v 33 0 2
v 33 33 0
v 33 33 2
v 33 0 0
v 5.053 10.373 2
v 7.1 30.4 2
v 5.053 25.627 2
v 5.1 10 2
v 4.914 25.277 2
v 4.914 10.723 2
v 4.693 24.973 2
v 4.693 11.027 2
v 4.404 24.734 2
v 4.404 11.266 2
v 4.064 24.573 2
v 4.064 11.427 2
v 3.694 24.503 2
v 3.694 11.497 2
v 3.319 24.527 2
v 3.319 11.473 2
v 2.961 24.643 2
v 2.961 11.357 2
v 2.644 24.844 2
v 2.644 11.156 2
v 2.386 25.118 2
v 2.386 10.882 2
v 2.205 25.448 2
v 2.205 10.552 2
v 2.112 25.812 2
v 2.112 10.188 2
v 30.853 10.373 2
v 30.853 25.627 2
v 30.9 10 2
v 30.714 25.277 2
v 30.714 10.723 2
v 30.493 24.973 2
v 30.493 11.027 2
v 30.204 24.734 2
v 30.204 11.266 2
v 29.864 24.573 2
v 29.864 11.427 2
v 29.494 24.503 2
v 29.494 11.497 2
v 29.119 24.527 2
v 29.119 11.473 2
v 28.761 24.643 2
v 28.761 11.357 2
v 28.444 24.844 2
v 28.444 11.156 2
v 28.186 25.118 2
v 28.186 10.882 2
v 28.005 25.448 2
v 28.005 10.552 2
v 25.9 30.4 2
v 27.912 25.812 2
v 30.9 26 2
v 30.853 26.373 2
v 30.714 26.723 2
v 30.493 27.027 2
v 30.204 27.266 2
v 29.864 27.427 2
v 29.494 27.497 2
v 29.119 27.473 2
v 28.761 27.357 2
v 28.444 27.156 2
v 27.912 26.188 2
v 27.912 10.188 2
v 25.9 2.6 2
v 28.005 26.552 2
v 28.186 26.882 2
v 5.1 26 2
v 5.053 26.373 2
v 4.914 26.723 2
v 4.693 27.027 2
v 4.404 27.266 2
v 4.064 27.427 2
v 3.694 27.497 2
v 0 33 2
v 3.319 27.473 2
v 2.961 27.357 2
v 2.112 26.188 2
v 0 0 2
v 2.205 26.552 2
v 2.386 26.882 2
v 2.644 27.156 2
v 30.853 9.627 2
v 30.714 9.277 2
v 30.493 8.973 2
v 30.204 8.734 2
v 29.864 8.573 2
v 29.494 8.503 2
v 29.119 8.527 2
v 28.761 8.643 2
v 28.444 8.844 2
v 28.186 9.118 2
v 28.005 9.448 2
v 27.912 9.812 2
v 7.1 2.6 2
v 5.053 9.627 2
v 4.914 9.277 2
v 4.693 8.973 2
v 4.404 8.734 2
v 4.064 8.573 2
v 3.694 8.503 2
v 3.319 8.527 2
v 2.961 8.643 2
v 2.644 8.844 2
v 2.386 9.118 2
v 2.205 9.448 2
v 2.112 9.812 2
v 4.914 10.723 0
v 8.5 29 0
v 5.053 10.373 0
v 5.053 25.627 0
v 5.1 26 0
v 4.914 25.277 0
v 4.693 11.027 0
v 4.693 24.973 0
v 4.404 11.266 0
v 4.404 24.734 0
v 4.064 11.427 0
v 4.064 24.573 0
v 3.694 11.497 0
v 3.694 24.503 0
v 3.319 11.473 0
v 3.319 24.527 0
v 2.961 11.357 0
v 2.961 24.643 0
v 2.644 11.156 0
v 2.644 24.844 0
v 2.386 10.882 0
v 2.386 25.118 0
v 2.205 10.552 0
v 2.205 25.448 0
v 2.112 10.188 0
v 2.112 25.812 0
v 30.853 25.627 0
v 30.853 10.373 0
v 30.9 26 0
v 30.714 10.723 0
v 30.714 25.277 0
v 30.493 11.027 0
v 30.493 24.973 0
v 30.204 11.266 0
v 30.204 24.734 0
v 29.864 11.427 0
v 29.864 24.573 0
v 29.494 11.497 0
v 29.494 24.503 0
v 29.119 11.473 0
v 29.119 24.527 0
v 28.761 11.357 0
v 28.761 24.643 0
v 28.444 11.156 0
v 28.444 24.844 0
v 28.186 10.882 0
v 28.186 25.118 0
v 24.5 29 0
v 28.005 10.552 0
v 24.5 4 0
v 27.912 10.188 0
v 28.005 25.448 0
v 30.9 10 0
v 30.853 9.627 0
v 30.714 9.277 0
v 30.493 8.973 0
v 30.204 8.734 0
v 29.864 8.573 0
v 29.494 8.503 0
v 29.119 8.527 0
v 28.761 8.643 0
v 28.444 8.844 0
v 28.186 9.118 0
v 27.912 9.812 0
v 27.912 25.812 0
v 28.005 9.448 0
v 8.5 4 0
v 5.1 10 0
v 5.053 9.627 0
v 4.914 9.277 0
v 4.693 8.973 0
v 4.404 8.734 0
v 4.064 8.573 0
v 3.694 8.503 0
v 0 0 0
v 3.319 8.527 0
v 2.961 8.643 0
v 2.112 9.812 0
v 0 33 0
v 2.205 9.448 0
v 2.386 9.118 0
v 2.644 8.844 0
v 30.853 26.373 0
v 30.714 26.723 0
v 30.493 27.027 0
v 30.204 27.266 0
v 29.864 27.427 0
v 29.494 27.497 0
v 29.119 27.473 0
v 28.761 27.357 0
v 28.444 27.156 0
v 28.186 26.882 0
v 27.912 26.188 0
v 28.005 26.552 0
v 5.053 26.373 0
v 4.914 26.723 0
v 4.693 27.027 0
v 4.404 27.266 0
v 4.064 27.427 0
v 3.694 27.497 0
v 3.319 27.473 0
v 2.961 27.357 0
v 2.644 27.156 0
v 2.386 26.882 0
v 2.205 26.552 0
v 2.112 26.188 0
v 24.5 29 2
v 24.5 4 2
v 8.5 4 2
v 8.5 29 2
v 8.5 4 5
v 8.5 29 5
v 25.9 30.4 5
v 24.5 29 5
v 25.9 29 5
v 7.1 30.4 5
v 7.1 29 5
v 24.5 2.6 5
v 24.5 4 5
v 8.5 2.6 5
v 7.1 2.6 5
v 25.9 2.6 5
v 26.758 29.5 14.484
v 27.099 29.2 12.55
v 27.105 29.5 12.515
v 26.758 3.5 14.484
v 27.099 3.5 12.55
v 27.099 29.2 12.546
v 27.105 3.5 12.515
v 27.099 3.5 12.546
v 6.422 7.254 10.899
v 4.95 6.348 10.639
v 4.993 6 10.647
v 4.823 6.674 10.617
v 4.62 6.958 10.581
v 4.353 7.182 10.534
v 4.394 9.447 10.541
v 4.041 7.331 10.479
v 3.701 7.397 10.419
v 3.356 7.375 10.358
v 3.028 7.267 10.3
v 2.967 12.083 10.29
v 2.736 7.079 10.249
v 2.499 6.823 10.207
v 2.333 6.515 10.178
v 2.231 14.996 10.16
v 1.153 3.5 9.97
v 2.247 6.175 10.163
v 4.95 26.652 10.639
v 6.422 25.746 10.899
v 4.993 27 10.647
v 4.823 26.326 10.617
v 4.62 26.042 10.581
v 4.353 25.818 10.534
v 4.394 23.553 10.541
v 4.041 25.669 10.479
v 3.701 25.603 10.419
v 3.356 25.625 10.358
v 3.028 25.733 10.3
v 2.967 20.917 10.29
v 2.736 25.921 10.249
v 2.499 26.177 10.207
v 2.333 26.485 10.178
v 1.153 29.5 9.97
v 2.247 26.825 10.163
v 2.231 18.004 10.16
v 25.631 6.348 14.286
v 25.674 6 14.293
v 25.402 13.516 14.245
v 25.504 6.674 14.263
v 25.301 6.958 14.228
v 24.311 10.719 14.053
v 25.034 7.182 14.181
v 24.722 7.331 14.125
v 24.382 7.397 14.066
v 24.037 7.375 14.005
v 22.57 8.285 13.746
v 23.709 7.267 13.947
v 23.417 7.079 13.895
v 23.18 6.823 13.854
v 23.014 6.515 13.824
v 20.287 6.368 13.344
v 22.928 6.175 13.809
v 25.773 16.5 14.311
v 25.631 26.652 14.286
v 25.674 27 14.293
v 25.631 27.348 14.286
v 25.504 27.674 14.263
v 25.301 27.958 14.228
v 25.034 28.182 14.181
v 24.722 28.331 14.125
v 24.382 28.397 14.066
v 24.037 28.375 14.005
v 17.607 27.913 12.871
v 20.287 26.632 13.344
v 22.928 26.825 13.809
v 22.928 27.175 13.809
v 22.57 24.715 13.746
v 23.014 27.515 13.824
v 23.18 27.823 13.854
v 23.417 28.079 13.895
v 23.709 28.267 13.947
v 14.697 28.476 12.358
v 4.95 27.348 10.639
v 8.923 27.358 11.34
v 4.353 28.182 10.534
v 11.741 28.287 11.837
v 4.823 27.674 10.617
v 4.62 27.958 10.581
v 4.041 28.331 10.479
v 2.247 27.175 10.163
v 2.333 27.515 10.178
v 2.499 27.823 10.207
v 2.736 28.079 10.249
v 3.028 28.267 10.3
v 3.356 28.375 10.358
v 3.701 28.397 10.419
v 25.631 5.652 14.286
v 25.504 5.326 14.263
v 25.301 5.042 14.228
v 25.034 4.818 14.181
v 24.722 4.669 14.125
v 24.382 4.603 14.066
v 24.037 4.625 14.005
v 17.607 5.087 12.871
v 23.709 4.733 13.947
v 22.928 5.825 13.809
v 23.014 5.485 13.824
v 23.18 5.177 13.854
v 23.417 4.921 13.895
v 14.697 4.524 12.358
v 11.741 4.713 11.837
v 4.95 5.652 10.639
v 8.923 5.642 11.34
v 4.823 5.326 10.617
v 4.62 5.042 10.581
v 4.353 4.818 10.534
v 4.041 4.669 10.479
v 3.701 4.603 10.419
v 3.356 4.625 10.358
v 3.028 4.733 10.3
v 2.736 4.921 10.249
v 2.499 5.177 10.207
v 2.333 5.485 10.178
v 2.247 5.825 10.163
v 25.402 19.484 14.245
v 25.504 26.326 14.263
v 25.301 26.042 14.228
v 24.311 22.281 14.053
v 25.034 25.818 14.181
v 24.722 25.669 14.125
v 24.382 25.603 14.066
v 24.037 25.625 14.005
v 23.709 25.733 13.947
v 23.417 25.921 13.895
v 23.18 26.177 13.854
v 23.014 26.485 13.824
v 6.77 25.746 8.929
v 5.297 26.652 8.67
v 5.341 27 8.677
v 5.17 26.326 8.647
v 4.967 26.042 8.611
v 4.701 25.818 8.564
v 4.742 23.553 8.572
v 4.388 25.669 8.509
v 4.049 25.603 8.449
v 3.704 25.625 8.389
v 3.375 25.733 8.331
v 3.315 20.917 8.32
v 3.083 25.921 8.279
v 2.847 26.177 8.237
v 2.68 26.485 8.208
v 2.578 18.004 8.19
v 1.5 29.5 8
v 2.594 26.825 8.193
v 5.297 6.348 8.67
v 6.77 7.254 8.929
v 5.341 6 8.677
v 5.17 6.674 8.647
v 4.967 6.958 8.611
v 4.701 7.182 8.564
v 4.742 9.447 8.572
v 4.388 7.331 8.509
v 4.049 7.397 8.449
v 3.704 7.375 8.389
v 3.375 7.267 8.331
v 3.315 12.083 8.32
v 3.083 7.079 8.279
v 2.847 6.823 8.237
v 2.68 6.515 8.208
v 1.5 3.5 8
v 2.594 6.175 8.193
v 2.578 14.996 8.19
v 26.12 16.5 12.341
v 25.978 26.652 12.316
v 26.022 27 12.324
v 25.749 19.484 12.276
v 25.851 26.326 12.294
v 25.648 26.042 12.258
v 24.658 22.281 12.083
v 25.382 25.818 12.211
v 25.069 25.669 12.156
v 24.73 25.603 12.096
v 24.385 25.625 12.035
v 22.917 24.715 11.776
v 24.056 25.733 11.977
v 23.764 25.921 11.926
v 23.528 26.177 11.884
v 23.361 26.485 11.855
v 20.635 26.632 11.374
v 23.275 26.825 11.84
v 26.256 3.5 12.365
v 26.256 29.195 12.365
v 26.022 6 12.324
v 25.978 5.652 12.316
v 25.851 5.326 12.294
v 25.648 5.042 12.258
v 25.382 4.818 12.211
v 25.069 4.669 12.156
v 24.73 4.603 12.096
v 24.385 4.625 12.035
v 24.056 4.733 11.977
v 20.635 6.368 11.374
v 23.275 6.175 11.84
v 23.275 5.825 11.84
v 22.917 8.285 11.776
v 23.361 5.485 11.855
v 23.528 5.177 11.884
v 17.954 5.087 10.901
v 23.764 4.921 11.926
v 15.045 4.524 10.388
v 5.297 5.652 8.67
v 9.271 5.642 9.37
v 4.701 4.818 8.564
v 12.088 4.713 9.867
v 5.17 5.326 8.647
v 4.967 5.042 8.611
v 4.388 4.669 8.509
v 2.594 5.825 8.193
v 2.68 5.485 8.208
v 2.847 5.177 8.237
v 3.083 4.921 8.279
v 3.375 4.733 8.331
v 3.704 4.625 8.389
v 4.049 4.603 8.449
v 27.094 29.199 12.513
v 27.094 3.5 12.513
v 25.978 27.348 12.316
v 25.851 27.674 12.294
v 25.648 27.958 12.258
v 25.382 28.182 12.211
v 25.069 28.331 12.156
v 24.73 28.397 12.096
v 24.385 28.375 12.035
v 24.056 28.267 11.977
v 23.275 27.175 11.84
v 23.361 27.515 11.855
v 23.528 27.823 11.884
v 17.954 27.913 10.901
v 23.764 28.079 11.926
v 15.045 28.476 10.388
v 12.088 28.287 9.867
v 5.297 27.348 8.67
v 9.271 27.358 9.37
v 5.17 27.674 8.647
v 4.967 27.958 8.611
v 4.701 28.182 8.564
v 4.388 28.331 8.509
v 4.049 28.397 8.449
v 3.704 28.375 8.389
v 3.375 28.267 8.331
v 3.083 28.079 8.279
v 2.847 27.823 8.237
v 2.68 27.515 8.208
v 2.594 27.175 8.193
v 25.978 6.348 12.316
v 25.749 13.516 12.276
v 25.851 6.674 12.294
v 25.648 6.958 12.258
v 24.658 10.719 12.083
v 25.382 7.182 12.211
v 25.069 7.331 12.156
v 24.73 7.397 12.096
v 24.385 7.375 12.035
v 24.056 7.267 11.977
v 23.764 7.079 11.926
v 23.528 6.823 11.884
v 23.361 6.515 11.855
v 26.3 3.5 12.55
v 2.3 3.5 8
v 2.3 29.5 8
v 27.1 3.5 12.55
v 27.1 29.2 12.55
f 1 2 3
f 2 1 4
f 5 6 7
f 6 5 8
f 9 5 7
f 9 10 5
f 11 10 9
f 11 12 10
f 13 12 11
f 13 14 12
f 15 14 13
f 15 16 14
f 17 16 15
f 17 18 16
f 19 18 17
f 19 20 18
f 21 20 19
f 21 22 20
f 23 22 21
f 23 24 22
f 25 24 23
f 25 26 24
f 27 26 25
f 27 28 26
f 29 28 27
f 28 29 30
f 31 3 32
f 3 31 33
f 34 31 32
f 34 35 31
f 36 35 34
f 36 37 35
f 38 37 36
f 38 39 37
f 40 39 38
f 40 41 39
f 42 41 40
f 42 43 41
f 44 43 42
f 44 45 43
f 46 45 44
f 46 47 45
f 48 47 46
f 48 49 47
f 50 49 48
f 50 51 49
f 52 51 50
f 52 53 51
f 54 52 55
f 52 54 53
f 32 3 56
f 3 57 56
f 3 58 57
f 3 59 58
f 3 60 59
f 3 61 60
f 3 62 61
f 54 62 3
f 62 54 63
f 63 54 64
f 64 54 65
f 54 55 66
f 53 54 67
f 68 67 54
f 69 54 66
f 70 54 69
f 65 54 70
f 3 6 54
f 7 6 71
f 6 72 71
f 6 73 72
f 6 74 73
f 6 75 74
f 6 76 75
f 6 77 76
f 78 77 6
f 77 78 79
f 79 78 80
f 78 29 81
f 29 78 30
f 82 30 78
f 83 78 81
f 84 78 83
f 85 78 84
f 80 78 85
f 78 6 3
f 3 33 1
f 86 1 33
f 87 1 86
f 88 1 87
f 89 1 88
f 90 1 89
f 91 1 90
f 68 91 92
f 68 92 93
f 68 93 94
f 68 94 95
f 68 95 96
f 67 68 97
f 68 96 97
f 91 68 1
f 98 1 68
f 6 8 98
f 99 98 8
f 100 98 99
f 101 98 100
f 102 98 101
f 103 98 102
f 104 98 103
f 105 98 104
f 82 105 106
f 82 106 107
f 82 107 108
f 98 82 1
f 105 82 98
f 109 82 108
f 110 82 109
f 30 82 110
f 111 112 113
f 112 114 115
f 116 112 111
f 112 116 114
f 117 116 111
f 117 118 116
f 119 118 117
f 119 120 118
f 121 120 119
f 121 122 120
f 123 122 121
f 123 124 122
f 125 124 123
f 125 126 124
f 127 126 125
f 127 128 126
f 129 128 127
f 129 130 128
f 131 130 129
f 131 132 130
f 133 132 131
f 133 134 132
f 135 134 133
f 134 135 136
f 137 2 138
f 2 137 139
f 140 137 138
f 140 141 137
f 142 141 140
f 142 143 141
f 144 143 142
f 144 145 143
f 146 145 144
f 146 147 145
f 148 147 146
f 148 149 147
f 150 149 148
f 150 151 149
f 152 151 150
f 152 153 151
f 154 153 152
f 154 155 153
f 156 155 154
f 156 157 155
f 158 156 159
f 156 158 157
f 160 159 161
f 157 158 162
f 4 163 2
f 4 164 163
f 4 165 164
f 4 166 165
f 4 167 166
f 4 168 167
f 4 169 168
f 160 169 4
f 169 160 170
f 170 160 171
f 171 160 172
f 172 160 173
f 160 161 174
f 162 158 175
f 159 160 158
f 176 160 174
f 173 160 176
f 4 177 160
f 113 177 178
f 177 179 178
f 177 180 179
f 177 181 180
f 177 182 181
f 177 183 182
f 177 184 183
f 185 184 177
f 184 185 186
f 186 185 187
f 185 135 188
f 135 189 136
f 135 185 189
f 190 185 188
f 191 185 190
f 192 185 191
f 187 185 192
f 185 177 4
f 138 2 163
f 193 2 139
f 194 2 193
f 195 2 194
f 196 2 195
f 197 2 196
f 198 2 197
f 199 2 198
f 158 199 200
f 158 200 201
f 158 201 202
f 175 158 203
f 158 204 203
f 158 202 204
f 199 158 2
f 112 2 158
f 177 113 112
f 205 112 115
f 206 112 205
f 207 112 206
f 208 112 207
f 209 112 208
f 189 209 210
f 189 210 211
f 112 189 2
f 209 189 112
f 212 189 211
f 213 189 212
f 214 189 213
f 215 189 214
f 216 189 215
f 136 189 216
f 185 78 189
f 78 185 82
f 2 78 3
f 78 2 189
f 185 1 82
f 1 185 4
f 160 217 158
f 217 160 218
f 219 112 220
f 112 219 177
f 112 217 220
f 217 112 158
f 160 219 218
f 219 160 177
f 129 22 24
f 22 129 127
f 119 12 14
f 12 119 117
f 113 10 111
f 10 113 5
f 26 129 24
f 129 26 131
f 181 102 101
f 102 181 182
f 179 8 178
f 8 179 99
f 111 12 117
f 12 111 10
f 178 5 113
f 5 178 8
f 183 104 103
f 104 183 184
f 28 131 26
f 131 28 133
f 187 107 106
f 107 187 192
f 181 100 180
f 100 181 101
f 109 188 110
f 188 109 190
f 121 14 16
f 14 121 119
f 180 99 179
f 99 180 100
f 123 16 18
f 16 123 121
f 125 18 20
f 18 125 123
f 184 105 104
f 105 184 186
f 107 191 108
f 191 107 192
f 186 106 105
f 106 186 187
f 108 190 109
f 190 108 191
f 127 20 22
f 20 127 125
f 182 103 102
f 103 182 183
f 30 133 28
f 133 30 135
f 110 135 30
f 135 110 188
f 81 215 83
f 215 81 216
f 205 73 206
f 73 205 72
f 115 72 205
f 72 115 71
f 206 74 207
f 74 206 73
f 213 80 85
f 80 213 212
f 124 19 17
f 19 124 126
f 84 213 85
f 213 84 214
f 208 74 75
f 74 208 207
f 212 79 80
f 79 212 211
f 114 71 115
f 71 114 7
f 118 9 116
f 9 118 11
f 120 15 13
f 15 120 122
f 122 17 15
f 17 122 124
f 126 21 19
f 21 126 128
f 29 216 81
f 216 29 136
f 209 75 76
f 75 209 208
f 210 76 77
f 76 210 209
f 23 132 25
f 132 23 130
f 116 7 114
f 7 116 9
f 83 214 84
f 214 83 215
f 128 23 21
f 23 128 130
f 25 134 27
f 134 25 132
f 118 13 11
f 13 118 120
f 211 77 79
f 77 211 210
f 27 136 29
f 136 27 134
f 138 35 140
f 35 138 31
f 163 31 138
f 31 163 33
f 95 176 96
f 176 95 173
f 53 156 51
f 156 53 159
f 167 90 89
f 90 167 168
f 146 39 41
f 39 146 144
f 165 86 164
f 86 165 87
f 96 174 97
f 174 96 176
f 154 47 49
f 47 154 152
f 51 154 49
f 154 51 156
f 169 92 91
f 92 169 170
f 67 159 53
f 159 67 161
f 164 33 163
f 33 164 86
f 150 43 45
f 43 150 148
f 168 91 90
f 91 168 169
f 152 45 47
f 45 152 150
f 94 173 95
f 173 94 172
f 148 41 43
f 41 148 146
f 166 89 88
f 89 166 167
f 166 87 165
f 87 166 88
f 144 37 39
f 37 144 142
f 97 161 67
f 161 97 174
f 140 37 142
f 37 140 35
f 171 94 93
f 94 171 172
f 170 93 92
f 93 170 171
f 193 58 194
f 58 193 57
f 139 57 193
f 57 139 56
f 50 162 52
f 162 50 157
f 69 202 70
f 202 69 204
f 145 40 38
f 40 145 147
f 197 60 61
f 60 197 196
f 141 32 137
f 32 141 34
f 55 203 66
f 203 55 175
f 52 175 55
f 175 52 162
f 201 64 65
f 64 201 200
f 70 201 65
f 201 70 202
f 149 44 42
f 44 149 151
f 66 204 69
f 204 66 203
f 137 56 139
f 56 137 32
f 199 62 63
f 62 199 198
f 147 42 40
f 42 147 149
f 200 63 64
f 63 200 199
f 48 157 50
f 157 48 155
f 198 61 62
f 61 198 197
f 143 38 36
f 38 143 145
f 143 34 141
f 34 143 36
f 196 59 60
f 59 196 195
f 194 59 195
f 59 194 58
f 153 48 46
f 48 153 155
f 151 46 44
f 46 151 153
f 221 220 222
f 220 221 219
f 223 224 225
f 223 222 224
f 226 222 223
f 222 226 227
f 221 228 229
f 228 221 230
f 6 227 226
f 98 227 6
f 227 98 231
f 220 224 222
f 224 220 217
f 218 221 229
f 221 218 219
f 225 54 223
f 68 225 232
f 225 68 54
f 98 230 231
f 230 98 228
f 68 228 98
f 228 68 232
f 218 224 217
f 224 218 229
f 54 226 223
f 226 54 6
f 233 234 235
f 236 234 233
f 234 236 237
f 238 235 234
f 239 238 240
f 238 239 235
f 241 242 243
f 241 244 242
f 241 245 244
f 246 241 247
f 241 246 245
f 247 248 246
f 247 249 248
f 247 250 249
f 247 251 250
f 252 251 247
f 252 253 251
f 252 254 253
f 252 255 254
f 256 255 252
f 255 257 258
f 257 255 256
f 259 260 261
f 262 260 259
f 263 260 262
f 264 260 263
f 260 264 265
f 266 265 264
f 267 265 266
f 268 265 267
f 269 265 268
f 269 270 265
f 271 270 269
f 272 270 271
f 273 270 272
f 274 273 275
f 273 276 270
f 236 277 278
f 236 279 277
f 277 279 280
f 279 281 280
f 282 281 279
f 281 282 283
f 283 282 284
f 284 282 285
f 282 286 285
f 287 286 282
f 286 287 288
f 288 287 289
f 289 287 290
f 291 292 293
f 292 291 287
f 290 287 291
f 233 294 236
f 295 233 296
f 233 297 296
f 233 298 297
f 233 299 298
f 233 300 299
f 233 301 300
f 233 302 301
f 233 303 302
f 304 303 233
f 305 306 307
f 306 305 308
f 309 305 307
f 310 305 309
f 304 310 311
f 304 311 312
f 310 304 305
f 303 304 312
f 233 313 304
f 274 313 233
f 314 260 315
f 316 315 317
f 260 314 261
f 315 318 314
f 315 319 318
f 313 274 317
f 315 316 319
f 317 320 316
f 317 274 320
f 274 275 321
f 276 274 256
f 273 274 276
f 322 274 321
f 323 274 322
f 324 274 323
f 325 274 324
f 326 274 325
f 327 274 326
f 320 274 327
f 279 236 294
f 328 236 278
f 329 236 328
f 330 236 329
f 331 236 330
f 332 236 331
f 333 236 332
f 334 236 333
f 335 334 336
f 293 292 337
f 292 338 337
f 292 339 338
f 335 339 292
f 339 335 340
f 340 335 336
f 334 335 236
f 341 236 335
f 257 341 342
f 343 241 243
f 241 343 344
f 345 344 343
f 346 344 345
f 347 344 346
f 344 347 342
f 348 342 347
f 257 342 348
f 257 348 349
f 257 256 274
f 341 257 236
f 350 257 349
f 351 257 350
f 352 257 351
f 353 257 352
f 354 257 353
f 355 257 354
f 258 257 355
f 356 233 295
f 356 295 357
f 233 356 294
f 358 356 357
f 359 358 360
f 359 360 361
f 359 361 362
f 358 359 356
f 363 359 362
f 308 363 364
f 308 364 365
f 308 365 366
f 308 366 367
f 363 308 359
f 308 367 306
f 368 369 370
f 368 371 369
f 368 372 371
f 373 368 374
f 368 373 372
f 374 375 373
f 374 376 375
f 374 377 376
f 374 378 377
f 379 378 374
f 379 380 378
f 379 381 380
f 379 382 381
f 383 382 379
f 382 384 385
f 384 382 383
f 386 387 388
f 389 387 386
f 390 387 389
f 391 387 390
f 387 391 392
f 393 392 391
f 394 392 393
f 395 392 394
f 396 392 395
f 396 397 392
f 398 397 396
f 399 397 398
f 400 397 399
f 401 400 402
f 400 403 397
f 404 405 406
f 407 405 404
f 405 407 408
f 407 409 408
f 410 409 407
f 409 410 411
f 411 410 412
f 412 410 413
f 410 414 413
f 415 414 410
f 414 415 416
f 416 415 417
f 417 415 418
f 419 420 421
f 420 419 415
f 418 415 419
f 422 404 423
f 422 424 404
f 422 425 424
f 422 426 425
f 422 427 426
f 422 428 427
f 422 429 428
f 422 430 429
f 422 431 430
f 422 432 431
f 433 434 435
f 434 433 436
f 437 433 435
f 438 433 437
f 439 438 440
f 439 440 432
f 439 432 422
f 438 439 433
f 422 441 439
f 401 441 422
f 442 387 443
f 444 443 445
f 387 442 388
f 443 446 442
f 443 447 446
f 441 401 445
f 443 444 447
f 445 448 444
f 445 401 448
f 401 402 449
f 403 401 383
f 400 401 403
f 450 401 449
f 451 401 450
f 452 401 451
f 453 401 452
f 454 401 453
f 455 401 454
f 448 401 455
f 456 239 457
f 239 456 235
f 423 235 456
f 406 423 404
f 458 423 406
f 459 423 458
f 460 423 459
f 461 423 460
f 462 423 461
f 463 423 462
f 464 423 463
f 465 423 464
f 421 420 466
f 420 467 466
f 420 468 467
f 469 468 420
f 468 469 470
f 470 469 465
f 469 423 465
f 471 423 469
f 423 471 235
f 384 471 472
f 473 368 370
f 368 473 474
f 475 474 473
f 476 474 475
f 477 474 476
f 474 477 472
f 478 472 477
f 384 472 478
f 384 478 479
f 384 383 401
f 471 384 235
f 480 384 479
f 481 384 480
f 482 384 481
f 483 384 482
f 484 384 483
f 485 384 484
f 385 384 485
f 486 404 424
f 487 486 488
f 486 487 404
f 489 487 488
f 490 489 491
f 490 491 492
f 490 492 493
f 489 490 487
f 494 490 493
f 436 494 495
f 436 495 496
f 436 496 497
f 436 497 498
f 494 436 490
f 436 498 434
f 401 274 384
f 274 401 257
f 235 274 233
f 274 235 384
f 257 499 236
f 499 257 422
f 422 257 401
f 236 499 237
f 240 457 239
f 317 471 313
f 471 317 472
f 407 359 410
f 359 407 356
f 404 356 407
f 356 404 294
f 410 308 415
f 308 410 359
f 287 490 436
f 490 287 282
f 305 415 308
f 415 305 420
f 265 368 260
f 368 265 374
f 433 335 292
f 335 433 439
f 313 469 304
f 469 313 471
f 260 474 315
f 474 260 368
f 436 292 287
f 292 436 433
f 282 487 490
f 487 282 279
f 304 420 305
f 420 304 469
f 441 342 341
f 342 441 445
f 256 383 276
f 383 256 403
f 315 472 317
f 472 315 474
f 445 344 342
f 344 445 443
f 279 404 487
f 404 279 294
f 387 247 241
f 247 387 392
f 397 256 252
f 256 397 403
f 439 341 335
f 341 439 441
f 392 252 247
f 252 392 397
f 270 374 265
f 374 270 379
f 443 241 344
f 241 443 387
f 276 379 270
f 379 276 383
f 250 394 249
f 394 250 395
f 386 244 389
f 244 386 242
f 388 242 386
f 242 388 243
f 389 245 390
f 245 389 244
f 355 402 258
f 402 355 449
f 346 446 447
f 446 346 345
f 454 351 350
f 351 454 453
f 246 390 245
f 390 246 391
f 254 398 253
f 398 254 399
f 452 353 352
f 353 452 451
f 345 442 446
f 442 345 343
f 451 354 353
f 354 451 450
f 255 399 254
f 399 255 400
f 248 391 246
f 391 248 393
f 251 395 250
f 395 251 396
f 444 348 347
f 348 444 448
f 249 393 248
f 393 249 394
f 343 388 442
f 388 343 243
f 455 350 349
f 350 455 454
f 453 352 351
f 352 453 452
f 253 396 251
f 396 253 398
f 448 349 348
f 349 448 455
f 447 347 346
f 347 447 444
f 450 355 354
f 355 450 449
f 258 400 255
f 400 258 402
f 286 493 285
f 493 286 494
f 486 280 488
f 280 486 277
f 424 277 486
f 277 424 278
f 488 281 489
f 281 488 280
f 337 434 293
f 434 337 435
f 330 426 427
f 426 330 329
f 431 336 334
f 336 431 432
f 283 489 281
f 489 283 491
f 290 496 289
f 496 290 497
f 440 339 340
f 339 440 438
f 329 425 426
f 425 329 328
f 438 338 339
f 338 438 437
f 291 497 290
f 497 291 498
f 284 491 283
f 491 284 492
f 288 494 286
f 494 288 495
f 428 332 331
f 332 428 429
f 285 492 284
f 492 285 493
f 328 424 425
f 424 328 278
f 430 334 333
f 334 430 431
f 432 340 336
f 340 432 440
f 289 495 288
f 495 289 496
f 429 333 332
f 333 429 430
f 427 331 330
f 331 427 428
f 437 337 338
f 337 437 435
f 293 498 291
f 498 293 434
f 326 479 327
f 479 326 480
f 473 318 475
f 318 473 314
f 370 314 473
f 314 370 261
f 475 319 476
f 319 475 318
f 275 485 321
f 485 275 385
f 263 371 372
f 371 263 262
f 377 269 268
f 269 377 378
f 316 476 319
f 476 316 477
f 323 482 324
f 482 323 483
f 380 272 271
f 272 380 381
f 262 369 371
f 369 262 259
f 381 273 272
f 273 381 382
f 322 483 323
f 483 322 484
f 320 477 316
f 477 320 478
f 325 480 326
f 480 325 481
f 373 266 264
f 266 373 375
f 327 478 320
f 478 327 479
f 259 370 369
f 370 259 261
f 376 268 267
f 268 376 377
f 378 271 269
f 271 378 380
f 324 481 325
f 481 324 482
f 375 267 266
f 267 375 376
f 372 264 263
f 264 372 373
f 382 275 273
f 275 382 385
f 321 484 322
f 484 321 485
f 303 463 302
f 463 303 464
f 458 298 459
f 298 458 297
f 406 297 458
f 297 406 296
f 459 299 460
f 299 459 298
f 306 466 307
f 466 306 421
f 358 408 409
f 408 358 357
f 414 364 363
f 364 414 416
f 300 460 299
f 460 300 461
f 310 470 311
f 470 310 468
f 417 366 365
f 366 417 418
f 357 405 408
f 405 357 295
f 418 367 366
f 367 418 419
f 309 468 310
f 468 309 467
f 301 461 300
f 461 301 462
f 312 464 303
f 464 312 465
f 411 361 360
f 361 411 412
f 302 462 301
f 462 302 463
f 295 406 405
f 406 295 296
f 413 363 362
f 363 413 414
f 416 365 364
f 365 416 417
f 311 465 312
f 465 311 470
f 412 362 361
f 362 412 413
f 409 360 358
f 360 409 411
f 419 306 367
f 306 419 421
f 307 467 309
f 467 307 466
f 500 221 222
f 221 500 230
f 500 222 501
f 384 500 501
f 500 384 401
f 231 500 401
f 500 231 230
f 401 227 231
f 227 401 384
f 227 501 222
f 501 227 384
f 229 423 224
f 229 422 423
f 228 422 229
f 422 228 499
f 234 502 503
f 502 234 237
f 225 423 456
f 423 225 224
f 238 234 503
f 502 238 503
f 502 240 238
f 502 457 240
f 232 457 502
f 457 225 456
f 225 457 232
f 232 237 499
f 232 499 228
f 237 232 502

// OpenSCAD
/*
 * Created by:
 * Thomas Buck <xythobuz@xythobuz.de> in April 2016
 *
 * Licensed under the Creative Commons - Attribution license.
 */

// -----------------------------------------------------------

base_width = 33;
base_height = 33;
base_depth = 2;

cutout_width = 16;
cutout_height = 25;

hole_dist_left = 3.6;
hole_dist_right = 3.6;
hole_dist_top = 7;
hole_dist_bottom = 10;
hole_size = 3;

fan_width = 26;
fan_diameter = 24;
fan_hole = 2.8;
fan_hole_dist = 2.5;

fan_angle = 10;
fan_x = -2;
fan_y = 0;
fan_z = 6;
first_wall = 3;
wall_size = 1.4;

angled_wall_size = 0.8;
rotation_add_x = -0.4;
rotation_add_z = 4.55;
mirror_dist_y = 6.6;

$fn = 25;

// -----------------------------------------------------------

module base() {
    difference() {
        cube([base_width, base_height, base_depth]);
    
        translate([(base_width - cutout_width) / 2, (base_height - cutout_height) / 2, -1])
            cube([cutout_width, cutout_height, base_depth + 2]);
        
        translate([hole_dist_left, hole_dist_bottom, -1])
            cylinder(d = hole_size, h = base_depth + 2);
        
        translate([hole_dist_left, base_height - hole_dist_top, -1])
            cylinder(d = hole_size, h = base_depth + 2);
        
        translate([base_width - hole_dist_right, hole_dist_bottom, -1])
            cylinder(d = hole_size, h = base_depth + 2);
        
        translate([base_width - hole_dist_right, base_height - hole_dist_top, -1])
            cylinder(d = hole_size, h = base_depth + 2);
    }
}

module rim() {
    translate([-wall_size, 0, 0])
        cube([wall_size, cutout_height, first_wall]);
    
    translate([-wall_size, -wall_size, 0])
        cube([cutout_width + (2 * wall_size), wall_size, first_wall]);
    
    translate([cutout_width, 0, 0])
        cube([wall_size, cutout_height, first_wall]);
    
    translate([-wall_size, cutout_height, 0])
        cube([cutout_width + (2 * wall_size), wall_size, first_wall]);
}

module angled() {
    polyhedron(points = [
        // 0: down, top left
        [(base_width - cutout_width) / 2 - wall_size, (base_height - cutout_height) / 2, base_depth + first_wall],
    
        // 1: down, top right
        [(base_width - cutout_width) / 2 + cutout_width + wall_size, (base_height - cutout_height) / 2, base_depth + first_wall],
    
        // 2: down, bottom right
        [(base_width - cutout_width) / 2 + cutout_width + wall_size, (base_height - cutout_height) / 2 - wall_size, base_depth + first_wall],
    
        // 3: down, bottom left
        [(base_width - cutout_width) / 2 - wall_size, (base_height - cutout_height) / 2 - wall_size, base_depth + first_wall],
    
        // 4: up, top left
        [(base_width - fan_width) / 2 + fan_x, (base_height - fan_width) / 2 + fan_y + angled_wall_size, base_depth + fan_z],
    
        // 5: up, top right
        [(base_width - fan_width) / 2 + fan_x + fan_width + rotation_add_x, (base_height - fan_width) / 2 + fan_y + angled_wall_size, base_depth + fan_z + rotation_add_z],
    
        // 6: up, bottom right
        [(base_width - fan_width) / 2 + fan_x + fan_width + rotation_add_x, (base_height - fan_width) / 2 + fan_y, base_depth + fan_z + rotation_add_z],
        
        // 7: up, bottom left
        [(base_width - fan_width) / 2 + fan_x, (base_height - fan_width) / 2 + fan_y, base_depth + fan_z]
    ], faces = [
        [0, 1, 2, 3], // bottom
        [4, 5, 1, 0], // back
        [7, 6, 5, 4], // top
        [5, 6, 2, 1], // right
        [6, 7, 3, 2], // front
        [7, 4, 0, 3]  // left
    ]);
}

module fan_mount() {
    difference() {
        cube([fan_width, fan_width, base_depth]);
        
        translate([fan_width / 2, fan_width / 2, -1])
            cylinder(d = fan_diameter, h = base_depth + 2);
        
        translate([fan_hole_dist, fan_hole_dist, -1])
            cylinder(d = fan_hole, h = base_depth + 2);
        
        translate([fan_width - fan_hole_dist, fan_hole_dist, -1])
            cylinder(d = fan_hole, h = base_depth + 2);
        
        translate([fan_hole_dist, fan_width - fan_hole_dist, -1])
            cylinder(d = fan_hole, h = base_depth + 2);
        
        translate([fan_width - fan_hole_dist, fan_width - fan_hole_dist, -1])
            cylinder(d = fan_hole, h = base_depth + 2);
    }
}

base();

translate([(base_width - cutout_width) / 2, (base_height - cutout_height) / 2, base_depth])
    rim();

angled();

translate([0, cutout_height + wall_size + mirror_dist_y, 0])
    mirror([0, 1, 0])
    angled();

polyhedron(points = [
    // 0: down, top left
    [(base_width - cutout_width) / 2, (base_height - cutout_height) / 2 + cutout_height, base_depth + first_wall],

    // 1: down, top right
    [(base_width - cutout_width) / 2, (base_height - cutout_height) / 2 - wall_size, base_depth + first_wall],

    // 2: down, bottom right
    [(base_width - cutout_width) / 2 - wall_size, (base_height - cutout_height) / 2 - wall_size, base_depth + first_wall],

    // 3: down, bottom left
    [(base_width - cutout_width) / 2 - wall_size, (base_height - cutout_height) / 2 + cutout_height, base_depth + first_wall],

    // 4: up, top left
    [(base_width - fan_width) / 2 + fan_x + angled_wall_size, (base_height - fan_width) / 2 + fan_y + fan_width, base_depth + fan_z],

    // 5: up, top right
    [(base_width - fan_width) / 2 + fan_x + angled_wall_size, (base_height - fan_width) / 2 + fan_y, base_depth + fan_z],

    // 6: up, bottom right
    [(base_width - fan_width) / 2 + fan_x, (base_height - fan_width) / 2 + fan_y, base_depth + fan_z],
    
    // 7: up, bottom left
    [(base_width - fan_width) / 2 + fan_x, (base_height - fan_width) / 2 + fan_y + fan_width, base_depth + fan_z]
], faces = [
    [0, 1, 2, 3], // bottom
    [4, 5, 1, 0], // back
    [7, 6, 5, 4], // top
    [5, 6, 2, 1], // right
    [6, 7, 3, 2], // front
    [7, 4, 0, 3]  // left
]);

polyhedron(points = [
    // 0: down, top left
    [(base_width - cutout_width) / 2 + cutout_width, (base_height - cutout_height) / 2 - wall_size, base_depth + first_wall],

    // 1: down, top right
    [(base_width - cutout_width) / 2 + cutout_width, (base_height - cutout_height) / 2 + cutout_height, base_depth + first_wall],

    // 2: down, bottom right
    [(base_width - cutout_width) / 2 + cutout_width + wall_size, (base_height - cutout_height) / 2 + cutout_height, base_depth + first_wall],

    // 3: down, bottom left
    [(base_width - cutout_width) / 2 + cutout_width + wall_size, (base_height - cutout_height) / 2 - wall_size, base_depth + first_wall],

    // 4: up, top left
    [(base_width - fan_width) / 2 + fan_x + fan_width + rotation_add_x - angled_wall_size, (base_height - fan_width) / 2 + fan_y, base_depth + fan_z + rotation_add_z],

    // 5: up, top right
    [(base_width - fan_width) / 2 + fan_x + fan_width + rotation_add_x - angled_wall_size, (base_height - fan_width + wall_size) / 2 + fan_y + cutout_height, base_depth + fan_z + rotation_add_z],

    // 6: up, bottom right
    [(base_width - fan_width) / 2 + fan_x + fan_width + rotation_add_x, (base_height - fan_width + wall_size) / 2 + fan_y + cutout_height, base_depth + fan_z + rotation_add_z],
    
    // 7: up, bottom left
    [(base_width - fan_width) / 2 + fan_x + fan_width + rotation_add_x, (base_height - fan_width) / 2 + fan_y, base_depth + fan_z + rotation_add_z]
], faces = [
    [0, 1, 2, 3], // bottom
    [4, 5, 1, 0], // back
    [7, 6, 5, 4], // top
    [5, 6, 2, 1], // right
    [6, 7, 3, 2], // front
    [7, 4, 0, 3]  // left
]);

translate([(base_width - fan_width) / 2 + fan_x, (base_height - fan_width) / 2 + fan_y, base_depth + fan_z])
    rotate([0, -fan_angle, 0])
    fan_mount();
